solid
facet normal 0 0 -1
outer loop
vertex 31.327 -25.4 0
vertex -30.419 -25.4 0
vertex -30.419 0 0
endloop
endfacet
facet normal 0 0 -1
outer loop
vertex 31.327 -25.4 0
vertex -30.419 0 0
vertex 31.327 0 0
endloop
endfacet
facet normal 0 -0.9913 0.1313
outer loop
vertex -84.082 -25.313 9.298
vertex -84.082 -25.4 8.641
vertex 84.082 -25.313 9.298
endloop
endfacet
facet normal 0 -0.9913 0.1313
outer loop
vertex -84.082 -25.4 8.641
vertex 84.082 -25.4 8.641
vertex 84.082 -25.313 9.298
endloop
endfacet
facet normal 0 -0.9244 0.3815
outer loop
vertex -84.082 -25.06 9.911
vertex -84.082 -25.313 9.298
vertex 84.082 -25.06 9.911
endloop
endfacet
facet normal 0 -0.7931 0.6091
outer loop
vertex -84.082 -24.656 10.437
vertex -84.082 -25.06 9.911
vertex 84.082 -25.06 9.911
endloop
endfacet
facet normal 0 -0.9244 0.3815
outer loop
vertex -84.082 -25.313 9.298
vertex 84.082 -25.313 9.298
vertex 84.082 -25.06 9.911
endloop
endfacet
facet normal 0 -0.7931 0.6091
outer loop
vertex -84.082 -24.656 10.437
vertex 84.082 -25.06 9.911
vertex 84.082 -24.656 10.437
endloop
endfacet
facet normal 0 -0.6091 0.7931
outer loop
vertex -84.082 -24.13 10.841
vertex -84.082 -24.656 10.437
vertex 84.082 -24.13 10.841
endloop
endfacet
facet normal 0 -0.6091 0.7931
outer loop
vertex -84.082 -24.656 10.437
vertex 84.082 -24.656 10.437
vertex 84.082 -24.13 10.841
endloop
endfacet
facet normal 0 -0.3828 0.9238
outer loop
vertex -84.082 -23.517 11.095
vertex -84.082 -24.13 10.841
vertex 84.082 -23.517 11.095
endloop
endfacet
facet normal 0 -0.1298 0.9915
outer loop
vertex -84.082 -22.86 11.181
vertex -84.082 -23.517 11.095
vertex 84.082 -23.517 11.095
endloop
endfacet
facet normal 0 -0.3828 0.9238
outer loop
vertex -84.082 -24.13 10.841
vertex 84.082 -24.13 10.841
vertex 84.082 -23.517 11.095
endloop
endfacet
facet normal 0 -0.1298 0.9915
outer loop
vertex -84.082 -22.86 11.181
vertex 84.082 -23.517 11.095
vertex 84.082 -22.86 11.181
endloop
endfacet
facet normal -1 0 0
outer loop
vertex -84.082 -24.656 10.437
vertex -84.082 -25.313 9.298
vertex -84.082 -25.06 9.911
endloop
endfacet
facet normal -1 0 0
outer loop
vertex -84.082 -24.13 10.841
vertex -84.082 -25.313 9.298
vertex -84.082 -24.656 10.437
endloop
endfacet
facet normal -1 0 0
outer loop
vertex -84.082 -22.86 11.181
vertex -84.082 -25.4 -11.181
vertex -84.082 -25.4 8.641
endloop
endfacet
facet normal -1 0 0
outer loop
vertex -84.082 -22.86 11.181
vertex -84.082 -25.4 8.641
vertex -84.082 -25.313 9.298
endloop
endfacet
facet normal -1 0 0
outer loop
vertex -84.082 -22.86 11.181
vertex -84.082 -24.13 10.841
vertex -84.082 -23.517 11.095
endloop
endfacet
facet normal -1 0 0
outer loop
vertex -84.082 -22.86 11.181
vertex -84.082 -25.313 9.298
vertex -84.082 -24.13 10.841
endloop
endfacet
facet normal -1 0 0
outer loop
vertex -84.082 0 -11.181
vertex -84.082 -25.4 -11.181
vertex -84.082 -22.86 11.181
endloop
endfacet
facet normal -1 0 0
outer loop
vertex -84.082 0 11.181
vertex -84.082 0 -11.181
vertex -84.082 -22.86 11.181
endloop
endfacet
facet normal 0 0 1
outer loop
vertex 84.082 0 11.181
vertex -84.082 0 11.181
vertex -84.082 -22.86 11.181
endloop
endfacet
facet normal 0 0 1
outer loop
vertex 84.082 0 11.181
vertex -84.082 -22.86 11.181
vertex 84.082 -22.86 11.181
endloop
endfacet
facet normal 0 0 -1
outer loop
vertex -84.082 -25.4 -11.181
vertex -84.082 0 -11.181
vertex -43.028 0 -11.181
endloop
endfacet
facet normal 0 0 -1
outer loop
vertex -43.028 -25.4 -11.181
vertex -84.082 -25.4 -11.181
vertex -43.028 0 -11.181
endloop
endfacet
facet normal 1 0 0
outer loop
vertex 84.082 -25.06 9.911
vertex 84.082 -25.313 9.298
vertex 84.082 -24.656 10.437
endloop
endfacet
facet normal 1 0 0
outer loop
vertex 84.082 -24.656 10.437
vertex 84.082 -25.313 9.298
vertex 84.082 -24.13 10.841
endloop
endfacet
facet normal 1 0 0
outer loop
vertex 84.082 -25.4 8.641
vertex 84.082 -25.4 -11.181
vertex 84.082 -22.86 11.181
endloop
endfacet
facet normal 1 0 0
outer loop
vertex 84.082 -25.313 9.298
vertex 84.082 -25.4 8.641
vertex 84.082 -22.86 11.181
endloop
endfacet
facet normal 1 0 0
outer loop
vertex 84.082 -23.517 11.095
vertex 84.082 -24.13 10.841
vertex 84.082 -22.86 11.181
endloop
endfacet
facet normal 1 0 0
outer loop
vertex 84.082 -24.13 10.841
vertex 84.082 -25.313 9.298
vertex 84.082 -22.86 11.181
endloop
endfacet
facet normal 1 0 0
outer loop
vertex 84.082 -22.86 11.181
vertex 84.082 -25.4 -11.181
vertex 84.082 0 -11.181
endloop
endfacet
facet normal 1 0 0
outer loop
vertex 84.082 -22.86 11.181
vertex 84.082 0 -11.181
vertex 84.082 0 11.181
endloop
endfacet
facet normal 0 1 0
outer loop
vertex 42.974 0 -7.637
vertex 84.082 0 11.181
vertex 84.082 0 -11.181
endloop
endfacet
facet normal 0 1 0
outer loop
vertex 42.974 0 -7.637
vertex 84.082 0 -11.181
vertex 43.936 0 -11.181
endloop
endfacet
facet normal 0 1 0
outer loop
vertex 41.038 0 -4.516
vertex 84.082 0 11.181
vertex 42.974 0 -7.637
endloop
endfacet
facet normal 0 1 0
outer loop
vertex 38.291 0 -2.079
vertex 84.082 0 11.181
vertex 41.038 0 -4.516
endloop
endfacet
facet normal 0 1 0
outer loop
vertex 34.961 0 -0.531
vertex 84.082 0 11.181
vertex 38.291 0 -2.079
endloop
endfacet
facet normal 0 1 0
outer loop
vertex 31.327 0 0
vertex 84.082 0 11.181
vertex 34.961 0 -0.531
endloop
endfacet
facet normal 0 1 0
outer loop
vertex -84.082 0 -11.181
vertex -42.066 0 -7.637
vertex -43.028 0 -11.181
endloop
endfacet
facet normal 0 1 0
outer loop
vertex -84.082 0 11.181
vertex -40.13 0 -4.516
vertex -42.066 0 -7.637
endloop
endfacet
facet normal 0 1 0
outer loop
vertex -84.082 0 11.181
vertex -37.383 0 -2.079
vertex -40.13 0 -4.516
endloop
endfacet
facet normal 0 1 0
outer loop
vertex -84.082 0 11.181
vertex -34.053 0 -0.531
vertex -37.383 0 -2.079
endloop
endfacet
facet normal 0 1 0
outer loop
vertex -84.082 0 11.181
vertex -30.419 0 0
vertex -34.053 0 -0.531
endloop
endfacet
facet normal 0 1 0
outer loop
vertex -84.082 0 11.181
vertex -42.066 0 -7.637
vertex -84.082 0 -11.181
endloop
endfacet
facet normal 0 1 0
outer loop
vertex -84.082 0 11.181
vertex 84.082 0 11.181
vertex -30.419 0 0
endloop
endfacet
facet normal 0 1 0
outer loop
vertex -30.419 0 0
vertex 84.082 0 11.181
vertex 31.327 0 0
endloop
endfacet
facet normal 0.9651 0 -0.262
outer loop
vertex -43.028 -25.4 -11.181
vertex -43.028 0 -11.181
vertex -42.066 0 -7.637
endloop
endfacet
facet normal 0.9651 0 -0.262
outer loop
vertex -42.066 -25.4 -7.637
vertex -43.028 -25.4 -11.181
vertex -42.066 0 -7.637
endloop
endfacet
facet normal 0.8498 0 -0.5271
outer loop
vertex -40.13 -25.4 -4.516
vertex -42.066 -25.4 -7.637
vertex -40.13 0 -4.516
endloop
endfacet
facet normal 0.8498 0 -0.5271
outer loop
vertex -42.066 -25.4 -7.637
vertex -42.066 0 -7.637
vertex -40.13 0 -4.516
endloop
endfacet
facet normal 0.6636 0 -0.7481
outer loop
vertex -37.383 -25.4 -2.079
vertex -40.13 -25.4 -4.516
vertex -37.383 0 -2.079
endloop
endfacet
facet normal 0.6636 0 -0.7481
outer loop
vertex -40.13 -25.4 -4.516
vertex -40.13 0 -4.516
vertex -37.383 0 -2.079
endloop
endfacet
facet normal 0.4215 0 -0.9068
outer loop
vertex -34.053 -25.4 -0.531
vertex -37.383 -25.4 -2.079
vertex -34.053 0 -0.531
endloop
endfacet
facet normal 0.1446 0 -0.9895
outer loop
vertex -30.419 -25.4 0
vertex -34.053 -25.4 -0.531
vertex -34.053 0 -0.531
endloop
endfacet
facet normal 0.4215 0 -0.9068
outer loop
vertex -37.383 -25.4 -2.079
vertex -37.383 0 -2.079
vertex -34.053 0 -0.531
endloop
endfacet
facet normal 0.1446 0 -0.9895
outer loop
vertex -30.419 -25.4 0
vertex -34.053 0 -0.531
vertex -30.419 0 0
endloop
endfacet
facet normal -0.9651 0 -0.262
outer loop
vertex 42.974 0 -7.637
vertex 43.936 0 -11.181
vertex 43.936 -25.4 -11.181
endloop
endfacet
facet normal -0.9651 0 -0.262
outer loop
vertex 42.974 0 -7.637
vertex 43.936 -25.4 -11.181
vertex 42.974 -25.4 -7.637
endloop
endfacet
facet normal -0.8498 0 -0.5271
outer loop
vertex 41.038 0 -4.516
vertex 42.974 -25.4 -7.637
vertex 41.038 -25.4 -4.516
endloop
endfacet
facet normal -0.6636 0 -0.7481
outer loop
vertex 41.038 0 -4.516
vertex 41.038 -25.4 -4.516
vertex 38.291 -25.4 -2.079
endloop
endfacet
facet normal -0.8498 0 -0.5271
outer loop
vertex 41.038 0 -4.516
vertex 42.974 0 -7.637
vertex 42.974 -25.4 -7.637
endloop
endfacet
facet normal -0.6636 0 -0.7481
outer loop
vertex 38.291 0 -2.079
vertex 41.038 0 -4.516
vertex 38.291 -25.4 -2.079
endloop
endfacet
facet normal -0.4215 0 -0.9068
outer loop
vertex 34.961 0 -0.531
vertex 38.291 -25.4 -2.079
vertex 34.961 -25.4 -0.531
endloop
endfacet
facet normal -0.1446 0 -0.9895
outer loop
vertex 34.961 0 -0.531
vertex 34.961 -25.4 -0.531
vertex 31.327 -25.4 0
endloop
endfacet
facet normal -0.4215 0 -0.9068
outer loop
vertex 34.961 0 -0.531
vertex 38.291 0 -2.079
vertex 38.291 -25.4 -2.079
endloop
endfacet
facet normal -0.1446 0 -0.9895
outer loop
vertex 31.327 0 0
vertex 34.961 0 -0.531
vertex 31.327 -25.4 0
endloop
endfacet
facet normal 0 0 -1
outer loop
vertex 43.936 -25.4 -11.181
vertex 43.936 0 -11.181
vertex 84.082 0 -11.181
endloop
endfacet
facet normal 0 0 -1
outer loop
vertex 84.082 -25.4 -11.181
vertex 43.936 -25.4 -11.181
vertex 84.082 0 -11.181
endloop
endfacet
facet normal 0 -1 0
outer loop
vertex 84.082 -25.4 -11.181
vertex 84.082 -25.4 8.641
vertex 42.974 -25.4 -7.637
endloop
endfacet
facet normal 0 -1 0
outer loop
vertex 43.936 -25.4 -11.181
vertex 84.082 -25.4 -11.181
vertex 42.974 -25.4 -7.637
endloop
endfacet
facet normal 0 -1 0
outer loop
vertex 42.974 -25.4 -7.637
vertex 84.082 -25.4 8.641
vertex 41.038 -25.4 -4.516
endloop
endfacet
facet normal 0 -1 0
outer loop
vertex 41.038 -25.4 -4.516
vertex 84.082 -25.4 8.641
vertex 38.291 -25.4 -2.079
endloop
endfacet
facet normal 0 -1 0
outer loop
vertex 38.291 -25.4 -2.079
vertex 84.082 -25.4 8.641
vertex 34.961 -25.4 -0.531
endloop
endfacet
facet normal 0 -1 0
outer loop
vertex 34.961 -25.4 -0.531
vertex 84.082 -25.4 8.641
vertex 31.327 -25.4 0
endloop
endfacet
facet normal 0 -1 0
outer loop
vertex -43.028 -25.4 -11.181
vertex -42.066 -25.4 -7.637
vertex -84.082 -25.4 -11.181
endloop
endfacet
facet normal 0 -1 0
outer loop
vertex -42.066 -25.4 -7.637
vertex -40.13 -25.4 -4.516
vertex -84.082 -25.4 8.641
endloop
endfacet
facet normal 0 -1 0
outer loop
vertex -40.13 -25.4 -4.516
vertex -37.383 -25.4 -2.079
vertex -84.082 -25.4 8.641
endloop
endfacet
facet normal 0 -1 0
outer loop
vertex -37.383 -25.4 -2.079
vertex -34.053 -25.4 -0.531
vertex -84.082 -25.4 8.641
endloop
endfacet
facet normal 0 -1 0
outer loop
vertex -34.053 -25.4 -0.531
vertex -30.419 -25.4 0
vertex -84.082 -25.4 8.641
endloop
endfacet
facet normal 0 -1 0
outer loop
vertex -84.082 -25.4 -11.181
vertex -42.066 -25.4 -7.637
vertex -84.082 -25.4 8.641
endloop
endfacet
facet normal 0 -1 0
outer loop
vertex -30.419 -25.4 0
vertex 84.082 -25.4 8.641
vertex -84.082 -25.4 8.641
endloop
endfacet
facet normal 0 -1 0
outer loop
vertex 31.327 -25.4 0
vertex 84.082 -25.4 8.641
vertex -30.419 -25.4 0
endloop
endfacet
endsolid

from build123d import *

# Parameters (mm, degrees)
F0_W        = 168.1647002697
F0_H        = 22.3620980978
F1_DEPTH    = 25.4
F2_W        = 86.963314563
F2_H        = 11.1810490489
F3_DEPTH    = 25.4
F4_T1_DEPTH = 25.4
F5_T1_DEPTH = 25.4
F6_R        = 2.54


# Not quite as in the source:
# - a fillet or chamfer that OpenCascade refuses, or shapes differently, is made with other operations: its cross-section is extruded or revolved along the edge and cut away or added


with BuildPart() as f1:
    # F0 (on Front) → F1 (new body)
    with BuildSketch(Plane.XZ):
        Rectangle(F0_W, F0_H)
    extrude(amount=F1_DEPTH)

    # F2 (on face) → F3 (cut)
    with BuildSketch(Plane.XZ.offset(25.4)):
        with Locations((0.4539322108, -5.5905245245)):
            Rectangle(F2_W, F2_H)
    extrude(amount=-F3_DEPTH, mode=Mode.SUBTRACT)

    # F4: fillet of radius 12.7 on 1 edges, made by hand

    # F4_s2 → F4_t1 (join)
    with BuildSketch(Plane.XZ):
        with BuildLine():
            ThreePointArc((-43.0277250707, -11.1810490489), (-38.8450170607, -3.1978771562), (-30.4188873761, 0))
            Line((-30.4188873761, 0), (-43.0277250707, 0))
            Line((-43.0277250707, 0), (-43.0277250707, -11.1810490489))
        make_face()
    extrude(amount=F4_T1_DEPTH)

    # F5: fillet of radius 12.7 on 1 edges, made by hand

    # F5_s2 → F5_t1 (join)
    with BuildSketch(Plane.XZ):
        with BuildLine():
            ThreePointArc((43.9355894923, -11.1810490489), (39.7528814823, -3.1978771562), (31.3267517977, 0))
            Line((31.3267517977, 0), (43.9355894923, 0))
            Line((43.9355894923, 0), (43.9355894923, -11.1810490489))
        make_face()
    extrude(amount=F5_T1_DEPTH)

    # F6
    f6_edges = [f1.edges().sort_by_distance(p)[0] for p in [
        (0, -25.4, 11.181049),
    ]]
    fillet(f6_edges, radius=F6_R)


solid = f1.part
